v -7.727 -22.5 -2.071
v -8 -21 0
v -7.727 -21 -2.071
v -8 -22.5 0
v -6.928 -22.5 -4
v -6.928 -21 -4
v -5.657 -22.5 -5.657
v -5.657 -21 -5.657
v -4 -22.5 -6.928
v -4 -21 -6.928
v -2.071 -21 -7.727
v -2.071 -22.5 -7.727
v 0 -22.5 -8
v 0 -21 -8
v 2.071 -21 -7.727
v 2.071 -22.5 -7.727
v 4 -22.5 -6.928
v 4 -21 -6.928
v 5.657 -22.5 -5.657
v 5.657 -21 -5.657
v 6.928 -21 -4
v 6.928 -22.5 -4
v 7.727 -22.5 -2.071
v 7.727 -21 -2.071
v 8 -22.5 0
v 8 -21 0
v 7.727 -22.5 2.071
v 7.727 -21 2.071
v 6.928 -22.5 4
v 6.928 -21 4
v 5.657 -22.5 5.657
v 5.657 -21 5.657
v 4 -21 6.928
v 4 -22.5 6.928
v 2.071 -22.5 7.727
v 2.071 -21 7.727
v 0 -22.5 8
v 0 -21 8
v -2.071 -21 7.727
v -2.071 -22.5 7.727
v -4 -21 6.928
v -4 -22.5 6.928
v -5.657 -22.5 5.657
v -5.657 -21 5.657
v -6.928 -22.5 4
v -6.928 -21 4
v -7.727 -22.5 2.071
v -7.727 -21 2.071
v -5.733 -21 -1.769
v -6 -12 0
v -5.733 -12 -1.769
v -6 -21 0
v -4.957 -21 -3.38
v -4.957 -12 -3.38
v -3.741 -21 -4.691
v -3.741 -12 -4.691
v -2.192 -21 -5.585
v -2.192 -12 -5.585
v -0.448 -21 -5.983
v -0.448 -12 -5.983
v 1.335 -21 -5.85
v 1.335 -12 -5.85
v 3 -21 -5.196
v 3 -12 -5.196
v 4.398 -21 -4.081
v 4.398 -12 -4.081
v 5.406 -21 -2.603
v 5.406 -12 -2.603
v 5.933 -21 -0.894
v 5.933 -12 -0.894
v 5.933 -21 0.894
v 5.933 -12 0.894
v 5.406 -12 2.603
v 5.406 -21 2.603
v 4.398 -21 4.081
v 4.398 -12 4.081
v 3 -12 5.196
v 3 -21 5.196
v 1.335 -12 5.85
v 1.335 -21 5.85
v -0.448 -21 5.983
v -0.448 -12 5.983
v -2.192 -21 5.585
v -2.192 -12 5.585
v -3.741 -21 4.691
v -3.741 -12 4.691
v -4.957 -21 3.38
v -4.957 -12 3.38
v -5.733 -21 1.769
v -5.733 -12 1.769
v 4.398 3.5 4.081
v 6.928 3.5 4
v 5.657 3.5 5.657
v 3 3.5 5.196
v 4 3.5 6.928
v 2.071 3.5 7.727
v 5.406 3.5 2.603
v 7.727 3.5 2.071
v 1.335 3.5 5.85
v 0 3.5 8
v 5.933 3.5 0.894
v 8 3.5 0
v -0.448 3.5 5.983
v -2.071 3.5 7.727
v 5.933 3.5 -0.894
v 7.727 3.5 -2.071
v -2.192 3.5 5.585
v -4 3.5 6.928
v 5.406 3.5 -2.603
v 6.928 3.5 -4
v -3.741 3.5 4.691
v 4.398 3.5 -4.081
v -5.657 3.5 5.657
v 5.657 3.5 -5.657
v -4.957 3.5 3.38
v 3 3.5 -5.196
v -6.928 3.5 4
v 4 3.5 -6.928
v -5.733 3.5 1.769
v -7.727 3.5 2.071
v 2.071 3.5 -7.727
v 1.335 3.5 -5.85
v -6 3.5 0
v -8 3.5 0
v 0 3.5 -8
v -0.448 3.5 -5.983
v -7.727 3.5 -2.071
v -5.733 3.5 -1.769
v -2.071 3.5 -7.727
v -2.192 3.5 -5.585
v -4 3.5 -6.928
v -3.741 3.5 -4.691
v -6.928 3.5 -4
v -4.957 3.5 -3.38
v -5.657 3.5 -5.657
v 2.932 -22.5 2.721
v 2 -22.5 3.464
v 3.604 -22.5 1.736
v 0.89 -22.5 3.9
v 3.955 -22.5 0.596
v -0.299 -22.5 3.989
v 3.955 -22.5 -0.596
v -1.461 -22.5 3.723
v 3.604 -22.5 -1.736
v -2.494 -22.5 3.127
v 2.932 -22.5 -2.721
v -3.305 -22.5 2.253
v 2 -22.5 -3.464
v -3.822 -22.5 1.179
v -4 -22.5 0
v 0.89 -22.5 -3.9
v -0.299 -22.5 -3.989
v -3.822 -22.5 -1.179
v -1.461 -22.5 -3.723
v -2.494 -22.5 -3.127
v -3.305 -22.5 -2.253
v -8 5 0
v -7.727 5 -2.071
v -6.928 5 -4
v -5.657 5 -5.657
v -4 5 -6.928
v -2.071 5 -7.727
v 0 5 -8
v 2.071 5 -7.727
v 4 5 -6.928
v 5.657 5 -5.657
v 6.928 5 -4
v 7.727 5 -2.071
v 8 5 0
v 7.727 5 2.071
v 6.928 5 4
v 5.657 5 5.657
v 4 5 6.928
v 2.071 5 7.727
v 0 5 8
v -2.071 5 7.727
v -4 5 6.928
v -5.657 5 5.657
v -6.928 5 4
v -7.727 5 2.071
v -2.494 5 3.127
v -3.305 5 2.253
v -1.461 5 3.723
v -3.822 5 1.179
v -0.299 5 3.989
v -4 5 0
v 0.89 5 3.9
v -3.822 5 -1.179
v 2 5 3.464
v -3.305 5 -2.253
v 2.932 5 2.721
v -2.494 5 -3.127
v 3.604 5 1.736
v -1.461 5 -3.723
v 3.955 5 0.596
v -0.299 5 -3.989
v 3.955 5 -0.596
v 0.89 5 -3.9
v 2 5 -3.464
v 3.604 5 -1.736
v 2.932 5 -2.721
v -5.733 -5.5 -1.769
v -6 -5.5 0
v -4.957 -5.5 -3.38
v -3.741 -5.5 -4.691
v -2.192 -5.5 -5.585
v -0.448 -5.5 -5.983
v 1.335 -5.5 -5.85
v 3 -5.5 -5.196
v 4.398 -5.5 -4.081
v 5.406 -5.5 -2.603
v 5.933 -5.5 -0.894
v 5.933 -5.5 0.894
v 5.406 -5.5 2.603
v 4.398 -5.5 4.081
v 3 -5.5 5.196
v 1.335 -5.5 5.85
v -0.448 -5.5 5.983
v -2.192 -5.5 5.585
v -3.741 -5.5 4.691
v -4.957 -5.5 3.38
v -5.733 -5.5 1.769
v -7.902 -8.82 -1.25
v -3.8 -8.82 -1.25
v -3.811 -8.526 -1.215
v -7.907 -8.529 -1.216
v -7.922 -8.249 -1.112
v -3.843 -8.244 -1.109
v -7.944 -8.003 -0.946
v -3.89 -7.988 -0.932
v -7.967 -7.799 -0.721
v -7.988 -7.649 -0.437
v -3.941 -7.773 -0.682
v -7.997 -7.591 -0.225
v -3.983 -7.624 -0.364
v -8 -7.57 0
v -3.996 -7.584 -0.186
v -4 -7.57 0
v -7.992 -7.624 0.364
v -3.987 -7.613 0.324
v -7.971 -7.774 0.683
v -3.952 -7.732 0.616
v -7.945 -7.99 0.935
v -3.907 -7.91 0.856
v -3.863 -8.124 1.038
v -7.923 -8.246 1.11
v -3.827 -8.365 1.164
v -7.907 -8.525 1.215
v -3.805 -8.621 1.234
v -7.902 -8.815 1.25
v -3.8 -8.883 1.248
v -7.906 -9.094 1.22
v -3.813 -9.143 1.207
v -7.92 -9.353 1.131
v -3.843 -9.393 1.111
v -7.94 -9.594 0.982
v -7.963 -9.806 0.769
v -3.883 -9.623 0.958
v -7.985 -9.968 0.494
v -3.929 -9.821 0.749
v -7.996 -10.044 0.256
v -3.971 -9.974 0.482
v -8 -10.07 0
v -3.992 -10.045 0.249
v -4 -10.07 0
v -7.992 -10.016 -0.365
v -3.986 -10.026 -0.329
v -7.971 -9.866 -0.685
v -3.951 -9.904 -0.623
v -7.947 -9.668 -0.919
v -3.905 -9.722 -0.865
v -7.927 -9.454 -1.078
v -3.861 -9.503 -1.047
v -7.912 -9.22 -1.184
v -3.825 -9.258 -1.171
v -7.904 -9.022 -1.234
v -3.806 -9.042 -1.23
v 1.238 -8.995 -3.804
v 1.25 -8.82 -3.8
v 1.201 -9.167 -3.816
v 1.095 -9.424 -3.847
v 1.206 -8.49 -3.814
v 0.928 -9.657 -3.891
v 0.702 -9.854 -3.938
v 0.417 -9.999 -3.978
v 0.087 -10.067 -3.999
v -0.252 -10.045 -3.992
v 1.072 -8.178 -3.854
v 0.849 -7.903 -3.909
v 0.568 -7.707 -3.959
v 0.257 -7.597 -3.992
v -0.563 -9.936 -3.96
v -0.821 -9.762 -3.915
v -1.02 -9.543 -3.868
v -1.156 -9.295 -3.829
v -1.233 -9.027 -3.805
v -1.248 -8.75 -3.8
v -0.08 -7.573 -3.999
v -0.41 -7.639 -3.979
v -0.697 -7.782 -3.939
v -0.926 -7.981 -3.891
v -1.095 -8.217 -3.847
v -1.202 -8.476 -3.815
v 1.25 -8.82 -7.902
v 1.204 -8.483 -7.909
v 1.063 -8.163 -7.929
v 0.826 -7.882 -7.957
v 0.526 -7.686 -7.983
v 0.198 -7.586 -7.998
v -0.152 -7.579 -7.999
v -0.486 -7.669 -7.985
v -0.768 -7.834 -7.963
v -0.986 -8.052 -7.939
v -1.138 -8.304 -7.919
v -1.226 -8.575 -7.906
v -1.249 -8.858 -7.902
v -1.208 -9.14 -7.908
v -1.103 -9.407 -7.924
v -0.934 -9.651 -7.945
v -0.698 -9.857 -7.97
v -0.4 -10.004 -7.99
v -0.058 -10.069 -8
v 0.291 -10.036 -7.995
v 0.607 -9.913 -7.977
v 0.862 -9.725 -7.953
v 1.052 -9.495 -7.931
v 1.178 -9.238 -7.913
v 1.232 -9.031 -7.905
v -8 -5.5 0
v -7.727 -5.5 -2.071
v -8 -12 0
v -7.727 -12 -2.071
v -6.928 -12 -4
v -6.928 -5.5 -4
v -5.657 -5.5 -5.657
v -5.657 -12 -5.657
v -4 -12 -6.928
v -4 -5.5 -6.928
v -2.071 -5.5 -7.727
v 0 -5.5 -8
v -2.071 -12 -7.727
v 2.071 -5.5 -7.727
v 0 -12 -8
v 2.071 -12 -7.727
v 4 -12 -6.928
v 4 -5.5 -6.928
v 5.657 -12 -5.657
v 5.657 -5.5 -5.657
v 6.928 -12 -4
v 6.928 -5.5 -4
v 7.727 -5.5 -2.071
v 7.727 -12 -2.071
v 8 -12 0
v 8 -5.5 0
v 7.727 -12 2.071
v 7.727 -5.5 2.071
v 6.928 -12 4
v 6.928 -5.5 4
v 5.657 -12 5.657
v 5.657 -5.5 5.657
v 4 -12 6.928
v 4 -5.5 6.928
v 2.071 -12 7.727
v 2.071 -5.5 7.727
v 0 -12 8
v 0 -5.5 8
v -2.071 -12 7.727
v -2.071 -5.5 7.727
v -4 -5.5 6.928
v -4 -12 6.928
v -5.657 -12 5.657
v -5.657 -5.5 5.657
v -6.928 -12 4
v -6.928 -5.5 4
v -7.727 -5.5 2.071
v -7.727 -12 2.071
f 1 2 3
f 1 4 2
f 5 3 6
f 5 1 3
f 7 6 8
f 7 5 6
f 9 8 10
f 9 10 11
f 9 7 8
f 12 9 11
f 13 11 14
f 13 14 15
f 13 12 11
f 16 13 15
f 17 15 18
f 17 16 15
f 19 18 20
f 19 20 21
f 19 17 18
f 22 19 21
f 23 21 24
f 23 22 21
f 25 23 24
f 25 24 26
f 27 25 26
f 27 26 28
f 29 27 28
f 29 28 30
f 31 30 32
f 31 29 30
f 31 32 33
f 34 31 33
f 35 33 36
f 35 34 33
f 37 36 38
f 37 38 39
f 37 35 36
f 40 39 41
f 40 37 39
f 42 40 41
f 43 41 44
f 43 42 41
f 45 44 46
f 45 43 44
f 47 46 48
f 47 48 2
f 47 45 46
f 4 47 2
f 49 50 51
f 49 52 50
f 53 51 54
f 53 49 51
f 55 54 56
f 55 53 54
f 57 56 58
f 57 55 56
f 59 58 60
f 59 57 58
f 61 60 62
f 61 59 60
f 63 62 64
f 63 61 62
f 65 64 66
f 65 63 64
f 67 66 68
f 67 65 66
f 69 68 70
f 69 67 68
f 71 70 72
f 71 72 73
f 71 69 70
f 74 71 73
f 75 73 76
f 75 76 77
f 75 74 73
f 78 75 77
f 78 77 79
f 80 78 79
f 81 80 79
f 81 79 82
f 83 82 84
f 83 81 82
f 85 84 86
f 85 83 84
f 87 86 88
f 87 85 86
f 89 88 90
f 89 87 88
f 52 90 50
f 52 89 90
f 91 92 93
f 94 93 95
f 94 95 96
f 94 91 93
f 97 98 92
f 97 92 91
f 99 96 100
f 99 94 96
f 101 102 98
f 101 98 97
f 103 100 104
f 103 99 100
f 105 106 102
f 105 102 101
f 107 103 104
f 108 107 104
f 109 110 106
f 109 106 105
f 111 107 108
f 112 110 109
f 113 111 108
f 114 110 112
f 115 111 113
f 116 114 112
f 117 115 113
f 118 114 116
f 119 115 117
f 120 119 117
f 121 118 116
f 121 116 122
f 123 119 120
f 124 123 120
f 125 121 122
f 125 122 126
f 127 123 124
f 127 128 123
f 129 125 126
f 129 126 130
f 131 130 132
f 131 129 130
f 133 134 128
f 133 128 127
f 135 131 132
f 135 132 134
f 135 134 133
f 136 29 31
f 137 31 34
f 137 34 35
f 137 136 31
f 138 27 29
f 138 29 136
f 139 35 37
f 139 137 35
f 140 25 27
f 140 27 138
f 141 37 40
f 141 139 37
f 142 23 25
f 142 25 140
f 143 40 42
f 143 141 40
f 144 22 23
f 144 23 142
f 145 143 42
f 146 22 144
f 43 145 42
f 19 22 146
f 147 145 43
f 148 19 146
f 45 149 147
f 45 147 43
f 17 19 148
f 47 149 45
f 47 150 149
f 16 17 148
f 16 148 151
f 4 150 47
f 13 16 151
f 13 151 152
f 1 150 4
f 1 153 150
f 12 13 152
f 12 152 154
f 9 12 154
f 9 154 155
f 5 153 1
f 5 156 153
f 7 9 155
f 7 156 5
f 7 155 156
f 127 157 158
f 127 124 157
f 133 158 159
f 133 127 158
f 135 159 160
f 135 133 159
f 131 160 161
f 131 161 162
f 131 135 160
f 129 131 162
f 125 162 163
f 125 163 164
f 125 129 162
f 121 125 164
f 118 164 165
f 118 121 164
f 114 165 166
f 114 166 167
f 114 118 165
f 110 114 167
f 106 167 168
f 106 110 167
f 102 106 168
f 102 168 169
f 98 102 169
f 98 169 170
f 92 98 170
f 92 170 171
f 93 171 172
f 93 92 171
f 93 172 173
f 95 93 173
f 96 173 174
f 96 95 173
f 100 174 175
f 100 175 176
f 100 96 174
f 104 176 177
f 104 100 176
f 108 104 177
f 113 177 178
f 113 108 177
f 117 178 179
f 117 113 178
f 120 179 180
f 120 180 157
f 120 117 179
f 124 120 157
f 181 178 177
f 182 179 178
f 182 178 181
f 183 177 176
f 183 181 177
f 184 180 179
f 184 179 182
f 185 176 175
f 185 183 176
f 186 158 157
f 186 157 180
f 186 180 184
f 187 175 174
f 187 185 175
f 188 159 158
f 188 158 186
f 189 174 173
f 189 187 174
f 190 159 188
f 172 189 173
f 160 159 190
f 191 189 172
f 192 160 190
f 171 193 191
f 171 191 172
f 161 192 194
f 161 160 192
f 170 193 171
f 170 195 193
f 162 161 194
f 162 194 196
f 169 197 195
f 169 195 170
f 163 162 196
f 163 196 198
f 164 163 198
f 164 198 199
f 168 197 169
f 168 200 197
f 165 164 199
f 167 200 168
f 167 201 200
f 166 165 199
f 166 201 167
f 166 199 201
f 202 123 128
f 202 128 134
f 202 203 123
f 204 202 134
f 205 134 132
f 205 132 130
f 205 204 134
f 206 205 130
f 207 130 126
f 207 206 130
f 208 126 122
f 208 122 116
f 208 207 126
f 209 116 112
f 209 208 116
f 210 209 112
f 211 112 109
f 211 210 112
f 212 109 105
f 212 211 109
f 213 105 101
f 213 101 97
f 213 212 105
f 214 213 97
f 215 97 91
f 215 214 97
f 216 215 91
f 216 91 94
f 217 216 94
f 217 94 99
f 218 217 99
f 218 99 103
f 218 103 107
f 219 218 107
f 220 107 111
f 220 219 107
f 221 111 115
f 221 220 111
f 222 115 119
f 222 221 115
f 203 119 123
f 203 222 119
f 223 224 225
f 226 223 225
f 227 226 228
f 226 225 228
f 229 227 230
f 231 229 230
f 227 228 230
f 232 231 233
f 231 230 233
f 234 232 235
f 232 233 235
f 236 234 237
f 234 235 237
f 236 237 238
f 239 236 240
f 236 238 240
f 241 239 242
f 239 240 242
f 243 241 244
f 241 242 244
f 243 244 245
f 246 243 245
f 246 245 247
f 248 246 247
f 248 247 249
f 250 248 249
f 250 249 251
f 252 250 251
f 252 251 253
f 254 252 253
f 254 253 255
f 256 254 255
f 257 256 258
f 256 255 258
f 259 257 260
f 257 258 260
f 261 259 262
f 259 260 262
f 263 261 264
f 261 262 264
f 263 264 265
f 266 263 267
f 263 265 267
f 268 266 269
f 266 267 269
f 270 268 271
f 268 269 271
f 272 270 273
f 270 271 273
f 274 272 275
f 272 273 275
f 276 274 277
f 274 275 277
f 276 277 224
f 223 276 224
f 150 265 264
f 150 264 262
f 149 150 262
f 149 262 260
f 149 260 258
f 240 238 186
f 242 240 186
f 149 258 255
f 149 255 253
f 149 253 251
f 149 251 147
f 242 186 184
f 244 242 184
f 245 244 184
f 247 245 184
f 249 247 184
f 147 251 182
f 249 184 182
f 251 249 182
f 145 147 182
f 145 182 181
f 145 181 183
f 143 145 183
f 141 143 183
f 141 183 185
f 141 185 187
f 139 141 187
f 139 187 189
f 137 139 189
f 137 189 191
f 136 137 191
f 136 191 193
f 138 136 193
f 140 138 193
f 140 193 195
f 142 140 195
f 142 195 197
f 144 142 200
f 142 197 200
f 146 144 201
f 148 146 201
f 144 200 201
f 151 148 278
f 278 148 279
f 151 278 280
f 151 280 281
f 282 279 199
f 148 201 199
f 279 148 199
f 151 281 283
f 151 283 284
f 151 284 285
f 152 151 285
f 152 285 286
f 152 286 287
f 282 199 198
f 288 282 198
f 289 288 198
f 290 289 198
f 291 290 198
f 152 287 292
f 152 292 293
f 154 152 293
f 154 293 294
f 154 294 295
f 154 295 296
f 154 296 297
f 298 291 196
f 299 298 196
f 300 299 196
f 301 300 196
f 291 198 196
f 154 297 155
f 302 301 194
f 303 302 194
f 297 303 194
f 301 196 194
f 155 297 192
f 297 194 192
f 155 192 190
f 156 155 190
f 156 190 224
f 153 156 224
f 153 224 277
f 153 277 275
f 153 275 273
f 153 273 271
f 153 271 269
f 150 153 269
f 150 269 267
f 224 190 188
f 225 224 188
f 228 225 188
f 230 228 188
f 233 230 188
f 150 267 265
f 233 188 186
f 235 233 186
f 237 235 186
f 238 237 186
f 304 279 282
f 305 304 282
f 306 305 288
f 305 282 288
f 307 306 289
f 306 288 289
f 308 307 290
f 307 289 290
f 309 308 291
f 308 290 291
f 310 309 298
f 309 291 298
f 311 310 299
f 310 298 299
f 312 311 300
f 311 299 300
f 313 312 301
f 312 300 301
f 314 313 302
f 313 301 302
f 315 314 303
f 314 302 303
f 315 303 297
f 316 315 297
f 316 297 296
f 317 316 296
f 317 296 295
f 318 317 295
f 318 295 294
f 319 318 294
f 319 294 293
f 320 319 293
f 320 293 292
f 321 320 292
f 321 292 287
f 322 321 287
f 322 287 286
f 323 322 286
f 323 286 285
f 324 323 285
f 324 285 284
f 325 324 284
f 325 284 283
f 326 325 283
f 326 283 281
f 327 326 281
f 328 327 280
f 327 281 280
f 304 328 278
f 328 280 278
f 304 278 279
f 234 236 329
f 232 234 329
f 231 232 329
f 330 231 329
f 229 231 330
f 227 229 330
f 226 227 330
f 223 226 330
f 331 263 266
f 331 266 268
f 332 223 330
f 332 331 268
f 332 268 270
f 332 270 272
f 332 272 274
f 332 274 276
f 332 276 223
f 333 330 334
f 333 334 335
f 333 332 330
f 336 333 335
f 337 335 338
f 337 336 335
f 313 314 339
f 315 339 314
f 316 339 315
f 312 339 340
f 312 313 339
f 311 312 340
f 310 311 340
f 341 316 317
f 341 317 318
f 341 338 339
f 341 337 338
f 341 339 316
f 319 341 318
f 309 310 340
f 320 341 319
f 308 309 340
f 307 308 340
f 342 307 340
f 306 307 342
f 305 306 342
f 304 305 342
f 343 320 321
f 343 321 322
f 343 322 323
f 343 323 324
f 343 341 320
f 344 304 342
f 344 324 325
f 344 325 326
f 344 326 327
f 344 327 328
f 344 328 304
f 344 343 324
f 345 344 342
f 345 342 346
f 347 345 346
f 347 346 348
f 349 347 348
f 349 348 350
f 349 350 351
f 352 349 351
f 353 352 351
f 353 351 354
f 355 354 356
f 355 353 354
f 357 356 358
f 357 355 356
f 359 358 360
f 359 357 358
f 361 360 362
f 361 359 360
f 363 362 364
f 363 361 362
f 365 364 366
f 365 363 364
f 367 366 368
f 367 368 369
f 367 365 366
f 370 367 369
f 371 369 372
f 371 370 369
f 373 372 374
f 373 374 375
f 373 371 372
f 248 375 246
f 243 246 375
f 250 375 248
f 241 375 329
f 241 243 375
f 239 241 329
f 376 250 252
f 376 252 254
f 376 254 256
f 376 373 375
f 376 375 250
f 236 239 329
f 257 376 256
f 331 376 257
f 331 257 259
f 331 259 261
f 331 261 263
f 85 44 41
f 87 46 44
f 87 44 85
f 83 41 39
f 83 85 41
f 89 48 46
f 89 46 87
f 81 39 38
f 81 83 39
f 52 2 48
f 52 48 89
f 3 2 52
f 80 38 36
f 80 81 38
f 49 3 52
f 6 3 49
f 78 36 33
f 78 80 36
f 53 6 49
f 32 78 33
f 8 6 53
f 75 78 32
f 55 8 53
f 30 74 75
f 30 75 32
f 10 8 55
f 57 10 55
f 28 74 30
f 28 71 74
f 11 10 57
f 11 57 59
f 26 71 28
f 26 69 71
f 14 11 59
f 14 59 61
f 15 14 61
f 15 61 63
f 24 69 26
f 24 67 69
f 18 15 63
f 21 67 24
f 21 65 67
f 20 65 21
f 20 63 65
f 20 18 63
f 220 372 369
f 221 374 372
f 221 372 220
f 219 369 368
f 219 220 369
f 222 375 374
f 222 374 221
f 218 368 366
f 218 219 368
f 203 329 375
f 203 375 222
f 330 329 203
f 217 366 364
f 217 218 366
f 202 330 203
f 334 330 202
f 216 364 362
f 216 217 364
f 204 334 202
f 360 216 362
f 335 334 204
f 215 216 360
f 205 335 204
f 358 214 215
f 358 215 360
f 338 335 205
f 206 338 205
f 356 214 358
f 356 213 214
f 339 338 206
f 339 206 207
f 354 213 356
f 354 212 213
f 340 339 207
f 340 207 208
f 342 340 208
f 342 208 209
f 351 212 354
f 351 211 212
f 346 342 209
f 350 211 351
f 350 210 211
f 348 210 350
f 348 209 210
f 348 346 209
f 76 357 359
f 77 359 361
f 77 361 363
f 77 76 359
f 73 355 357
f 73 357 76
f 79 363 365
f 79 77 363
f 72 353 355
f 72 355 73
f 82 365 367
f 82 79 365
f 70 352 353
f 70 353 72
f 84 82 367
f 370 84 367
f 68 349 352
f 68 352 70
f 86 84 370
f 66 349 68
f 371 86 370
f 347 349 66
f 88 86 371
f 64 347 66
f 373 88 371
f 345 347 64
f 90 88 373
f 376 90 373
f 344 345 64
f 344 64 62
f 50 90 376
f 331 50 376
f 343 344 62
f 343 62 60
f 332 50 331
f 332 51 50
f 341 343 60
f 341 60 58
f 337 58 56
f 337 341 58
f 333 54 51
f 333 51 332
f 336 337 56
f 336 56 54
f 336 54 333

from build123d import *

# Parameters (mm, degrees)
CUT_EXTRUDE1_REACH = 31.736
SKETCH2_R          = 4
SKETCH3_R          = 1.25
CUT_EXTRUDE2_DEPTH = 10
CIRPATTERN1_COUNT  = 2
CIRPATTERN1_ANGLE  = 90


with BuildPart() as part:
    # Sketch1 → Revolve1 (revolve)
    with BuildSketch(Plane.XY):
        Polygon((0, 5), (-8, 5), (-8, 3.5), (-6, 3.5), (-6, -5.5), (-8, -5.5), (-8, -12), (-6, -12), (-6, -21), (-8, -21), (-8, -22.5), (0, -22.5), align=None)
    revolve(axis=Axis((0, 291.267844828, 0), (0, -1, 0)))

    # Sketch2 → Cut-Extrude1 (cut, up to next)
    with BuildSketch(Plane(origin=(0, 5, 0), x_dir=(1, 0, 0), z_dir=(0, 1, 0)), mode=Mode.PRIVATE) as cut_extrude1_sk1:
        with Locations(Location((0, 0, 0), (0, 0, 180))):
            Circle(SKETCH2_R)
    cut_extrude1_tool1 = extrude(cut_extrude1_sk1.sketch, amount=-CUT_EXTRUDE1_REACH, mode=Mode.PRIVATE) & part.part
    add(cut_extrude1_tool1.solids().sort_by_distance((0, 5, 0))[0], mode=Mode.SUBTRACT)

    # Sketch3 → Cut-Extrude2 (cut)
    with BuildSketch(Plane.XY):
        with Locations((0, -8.820149855)):
            Circle(SKETCH3_R)
    cut_extrude2 = extrude(amount=-CUT_EXTRUDE2_DEPTH, mode=Mode.SUBTRACT)

    # CirPattern1: Cut-Extrude2 ×2 about axis
    cirpattern1_axis = Axis((0, -22.5, 0), (0, 1, 0))
    for i in range(1, CIRPATTERN1_COUNT):
        add(cut_extrude2.rotate(cirpattern1_axis, i * CIRPATTERN1_ANGLE / (CIRPATTERN1_COUNT - 1)), mode=Mode.SUBTRACT)


solid = part.part
